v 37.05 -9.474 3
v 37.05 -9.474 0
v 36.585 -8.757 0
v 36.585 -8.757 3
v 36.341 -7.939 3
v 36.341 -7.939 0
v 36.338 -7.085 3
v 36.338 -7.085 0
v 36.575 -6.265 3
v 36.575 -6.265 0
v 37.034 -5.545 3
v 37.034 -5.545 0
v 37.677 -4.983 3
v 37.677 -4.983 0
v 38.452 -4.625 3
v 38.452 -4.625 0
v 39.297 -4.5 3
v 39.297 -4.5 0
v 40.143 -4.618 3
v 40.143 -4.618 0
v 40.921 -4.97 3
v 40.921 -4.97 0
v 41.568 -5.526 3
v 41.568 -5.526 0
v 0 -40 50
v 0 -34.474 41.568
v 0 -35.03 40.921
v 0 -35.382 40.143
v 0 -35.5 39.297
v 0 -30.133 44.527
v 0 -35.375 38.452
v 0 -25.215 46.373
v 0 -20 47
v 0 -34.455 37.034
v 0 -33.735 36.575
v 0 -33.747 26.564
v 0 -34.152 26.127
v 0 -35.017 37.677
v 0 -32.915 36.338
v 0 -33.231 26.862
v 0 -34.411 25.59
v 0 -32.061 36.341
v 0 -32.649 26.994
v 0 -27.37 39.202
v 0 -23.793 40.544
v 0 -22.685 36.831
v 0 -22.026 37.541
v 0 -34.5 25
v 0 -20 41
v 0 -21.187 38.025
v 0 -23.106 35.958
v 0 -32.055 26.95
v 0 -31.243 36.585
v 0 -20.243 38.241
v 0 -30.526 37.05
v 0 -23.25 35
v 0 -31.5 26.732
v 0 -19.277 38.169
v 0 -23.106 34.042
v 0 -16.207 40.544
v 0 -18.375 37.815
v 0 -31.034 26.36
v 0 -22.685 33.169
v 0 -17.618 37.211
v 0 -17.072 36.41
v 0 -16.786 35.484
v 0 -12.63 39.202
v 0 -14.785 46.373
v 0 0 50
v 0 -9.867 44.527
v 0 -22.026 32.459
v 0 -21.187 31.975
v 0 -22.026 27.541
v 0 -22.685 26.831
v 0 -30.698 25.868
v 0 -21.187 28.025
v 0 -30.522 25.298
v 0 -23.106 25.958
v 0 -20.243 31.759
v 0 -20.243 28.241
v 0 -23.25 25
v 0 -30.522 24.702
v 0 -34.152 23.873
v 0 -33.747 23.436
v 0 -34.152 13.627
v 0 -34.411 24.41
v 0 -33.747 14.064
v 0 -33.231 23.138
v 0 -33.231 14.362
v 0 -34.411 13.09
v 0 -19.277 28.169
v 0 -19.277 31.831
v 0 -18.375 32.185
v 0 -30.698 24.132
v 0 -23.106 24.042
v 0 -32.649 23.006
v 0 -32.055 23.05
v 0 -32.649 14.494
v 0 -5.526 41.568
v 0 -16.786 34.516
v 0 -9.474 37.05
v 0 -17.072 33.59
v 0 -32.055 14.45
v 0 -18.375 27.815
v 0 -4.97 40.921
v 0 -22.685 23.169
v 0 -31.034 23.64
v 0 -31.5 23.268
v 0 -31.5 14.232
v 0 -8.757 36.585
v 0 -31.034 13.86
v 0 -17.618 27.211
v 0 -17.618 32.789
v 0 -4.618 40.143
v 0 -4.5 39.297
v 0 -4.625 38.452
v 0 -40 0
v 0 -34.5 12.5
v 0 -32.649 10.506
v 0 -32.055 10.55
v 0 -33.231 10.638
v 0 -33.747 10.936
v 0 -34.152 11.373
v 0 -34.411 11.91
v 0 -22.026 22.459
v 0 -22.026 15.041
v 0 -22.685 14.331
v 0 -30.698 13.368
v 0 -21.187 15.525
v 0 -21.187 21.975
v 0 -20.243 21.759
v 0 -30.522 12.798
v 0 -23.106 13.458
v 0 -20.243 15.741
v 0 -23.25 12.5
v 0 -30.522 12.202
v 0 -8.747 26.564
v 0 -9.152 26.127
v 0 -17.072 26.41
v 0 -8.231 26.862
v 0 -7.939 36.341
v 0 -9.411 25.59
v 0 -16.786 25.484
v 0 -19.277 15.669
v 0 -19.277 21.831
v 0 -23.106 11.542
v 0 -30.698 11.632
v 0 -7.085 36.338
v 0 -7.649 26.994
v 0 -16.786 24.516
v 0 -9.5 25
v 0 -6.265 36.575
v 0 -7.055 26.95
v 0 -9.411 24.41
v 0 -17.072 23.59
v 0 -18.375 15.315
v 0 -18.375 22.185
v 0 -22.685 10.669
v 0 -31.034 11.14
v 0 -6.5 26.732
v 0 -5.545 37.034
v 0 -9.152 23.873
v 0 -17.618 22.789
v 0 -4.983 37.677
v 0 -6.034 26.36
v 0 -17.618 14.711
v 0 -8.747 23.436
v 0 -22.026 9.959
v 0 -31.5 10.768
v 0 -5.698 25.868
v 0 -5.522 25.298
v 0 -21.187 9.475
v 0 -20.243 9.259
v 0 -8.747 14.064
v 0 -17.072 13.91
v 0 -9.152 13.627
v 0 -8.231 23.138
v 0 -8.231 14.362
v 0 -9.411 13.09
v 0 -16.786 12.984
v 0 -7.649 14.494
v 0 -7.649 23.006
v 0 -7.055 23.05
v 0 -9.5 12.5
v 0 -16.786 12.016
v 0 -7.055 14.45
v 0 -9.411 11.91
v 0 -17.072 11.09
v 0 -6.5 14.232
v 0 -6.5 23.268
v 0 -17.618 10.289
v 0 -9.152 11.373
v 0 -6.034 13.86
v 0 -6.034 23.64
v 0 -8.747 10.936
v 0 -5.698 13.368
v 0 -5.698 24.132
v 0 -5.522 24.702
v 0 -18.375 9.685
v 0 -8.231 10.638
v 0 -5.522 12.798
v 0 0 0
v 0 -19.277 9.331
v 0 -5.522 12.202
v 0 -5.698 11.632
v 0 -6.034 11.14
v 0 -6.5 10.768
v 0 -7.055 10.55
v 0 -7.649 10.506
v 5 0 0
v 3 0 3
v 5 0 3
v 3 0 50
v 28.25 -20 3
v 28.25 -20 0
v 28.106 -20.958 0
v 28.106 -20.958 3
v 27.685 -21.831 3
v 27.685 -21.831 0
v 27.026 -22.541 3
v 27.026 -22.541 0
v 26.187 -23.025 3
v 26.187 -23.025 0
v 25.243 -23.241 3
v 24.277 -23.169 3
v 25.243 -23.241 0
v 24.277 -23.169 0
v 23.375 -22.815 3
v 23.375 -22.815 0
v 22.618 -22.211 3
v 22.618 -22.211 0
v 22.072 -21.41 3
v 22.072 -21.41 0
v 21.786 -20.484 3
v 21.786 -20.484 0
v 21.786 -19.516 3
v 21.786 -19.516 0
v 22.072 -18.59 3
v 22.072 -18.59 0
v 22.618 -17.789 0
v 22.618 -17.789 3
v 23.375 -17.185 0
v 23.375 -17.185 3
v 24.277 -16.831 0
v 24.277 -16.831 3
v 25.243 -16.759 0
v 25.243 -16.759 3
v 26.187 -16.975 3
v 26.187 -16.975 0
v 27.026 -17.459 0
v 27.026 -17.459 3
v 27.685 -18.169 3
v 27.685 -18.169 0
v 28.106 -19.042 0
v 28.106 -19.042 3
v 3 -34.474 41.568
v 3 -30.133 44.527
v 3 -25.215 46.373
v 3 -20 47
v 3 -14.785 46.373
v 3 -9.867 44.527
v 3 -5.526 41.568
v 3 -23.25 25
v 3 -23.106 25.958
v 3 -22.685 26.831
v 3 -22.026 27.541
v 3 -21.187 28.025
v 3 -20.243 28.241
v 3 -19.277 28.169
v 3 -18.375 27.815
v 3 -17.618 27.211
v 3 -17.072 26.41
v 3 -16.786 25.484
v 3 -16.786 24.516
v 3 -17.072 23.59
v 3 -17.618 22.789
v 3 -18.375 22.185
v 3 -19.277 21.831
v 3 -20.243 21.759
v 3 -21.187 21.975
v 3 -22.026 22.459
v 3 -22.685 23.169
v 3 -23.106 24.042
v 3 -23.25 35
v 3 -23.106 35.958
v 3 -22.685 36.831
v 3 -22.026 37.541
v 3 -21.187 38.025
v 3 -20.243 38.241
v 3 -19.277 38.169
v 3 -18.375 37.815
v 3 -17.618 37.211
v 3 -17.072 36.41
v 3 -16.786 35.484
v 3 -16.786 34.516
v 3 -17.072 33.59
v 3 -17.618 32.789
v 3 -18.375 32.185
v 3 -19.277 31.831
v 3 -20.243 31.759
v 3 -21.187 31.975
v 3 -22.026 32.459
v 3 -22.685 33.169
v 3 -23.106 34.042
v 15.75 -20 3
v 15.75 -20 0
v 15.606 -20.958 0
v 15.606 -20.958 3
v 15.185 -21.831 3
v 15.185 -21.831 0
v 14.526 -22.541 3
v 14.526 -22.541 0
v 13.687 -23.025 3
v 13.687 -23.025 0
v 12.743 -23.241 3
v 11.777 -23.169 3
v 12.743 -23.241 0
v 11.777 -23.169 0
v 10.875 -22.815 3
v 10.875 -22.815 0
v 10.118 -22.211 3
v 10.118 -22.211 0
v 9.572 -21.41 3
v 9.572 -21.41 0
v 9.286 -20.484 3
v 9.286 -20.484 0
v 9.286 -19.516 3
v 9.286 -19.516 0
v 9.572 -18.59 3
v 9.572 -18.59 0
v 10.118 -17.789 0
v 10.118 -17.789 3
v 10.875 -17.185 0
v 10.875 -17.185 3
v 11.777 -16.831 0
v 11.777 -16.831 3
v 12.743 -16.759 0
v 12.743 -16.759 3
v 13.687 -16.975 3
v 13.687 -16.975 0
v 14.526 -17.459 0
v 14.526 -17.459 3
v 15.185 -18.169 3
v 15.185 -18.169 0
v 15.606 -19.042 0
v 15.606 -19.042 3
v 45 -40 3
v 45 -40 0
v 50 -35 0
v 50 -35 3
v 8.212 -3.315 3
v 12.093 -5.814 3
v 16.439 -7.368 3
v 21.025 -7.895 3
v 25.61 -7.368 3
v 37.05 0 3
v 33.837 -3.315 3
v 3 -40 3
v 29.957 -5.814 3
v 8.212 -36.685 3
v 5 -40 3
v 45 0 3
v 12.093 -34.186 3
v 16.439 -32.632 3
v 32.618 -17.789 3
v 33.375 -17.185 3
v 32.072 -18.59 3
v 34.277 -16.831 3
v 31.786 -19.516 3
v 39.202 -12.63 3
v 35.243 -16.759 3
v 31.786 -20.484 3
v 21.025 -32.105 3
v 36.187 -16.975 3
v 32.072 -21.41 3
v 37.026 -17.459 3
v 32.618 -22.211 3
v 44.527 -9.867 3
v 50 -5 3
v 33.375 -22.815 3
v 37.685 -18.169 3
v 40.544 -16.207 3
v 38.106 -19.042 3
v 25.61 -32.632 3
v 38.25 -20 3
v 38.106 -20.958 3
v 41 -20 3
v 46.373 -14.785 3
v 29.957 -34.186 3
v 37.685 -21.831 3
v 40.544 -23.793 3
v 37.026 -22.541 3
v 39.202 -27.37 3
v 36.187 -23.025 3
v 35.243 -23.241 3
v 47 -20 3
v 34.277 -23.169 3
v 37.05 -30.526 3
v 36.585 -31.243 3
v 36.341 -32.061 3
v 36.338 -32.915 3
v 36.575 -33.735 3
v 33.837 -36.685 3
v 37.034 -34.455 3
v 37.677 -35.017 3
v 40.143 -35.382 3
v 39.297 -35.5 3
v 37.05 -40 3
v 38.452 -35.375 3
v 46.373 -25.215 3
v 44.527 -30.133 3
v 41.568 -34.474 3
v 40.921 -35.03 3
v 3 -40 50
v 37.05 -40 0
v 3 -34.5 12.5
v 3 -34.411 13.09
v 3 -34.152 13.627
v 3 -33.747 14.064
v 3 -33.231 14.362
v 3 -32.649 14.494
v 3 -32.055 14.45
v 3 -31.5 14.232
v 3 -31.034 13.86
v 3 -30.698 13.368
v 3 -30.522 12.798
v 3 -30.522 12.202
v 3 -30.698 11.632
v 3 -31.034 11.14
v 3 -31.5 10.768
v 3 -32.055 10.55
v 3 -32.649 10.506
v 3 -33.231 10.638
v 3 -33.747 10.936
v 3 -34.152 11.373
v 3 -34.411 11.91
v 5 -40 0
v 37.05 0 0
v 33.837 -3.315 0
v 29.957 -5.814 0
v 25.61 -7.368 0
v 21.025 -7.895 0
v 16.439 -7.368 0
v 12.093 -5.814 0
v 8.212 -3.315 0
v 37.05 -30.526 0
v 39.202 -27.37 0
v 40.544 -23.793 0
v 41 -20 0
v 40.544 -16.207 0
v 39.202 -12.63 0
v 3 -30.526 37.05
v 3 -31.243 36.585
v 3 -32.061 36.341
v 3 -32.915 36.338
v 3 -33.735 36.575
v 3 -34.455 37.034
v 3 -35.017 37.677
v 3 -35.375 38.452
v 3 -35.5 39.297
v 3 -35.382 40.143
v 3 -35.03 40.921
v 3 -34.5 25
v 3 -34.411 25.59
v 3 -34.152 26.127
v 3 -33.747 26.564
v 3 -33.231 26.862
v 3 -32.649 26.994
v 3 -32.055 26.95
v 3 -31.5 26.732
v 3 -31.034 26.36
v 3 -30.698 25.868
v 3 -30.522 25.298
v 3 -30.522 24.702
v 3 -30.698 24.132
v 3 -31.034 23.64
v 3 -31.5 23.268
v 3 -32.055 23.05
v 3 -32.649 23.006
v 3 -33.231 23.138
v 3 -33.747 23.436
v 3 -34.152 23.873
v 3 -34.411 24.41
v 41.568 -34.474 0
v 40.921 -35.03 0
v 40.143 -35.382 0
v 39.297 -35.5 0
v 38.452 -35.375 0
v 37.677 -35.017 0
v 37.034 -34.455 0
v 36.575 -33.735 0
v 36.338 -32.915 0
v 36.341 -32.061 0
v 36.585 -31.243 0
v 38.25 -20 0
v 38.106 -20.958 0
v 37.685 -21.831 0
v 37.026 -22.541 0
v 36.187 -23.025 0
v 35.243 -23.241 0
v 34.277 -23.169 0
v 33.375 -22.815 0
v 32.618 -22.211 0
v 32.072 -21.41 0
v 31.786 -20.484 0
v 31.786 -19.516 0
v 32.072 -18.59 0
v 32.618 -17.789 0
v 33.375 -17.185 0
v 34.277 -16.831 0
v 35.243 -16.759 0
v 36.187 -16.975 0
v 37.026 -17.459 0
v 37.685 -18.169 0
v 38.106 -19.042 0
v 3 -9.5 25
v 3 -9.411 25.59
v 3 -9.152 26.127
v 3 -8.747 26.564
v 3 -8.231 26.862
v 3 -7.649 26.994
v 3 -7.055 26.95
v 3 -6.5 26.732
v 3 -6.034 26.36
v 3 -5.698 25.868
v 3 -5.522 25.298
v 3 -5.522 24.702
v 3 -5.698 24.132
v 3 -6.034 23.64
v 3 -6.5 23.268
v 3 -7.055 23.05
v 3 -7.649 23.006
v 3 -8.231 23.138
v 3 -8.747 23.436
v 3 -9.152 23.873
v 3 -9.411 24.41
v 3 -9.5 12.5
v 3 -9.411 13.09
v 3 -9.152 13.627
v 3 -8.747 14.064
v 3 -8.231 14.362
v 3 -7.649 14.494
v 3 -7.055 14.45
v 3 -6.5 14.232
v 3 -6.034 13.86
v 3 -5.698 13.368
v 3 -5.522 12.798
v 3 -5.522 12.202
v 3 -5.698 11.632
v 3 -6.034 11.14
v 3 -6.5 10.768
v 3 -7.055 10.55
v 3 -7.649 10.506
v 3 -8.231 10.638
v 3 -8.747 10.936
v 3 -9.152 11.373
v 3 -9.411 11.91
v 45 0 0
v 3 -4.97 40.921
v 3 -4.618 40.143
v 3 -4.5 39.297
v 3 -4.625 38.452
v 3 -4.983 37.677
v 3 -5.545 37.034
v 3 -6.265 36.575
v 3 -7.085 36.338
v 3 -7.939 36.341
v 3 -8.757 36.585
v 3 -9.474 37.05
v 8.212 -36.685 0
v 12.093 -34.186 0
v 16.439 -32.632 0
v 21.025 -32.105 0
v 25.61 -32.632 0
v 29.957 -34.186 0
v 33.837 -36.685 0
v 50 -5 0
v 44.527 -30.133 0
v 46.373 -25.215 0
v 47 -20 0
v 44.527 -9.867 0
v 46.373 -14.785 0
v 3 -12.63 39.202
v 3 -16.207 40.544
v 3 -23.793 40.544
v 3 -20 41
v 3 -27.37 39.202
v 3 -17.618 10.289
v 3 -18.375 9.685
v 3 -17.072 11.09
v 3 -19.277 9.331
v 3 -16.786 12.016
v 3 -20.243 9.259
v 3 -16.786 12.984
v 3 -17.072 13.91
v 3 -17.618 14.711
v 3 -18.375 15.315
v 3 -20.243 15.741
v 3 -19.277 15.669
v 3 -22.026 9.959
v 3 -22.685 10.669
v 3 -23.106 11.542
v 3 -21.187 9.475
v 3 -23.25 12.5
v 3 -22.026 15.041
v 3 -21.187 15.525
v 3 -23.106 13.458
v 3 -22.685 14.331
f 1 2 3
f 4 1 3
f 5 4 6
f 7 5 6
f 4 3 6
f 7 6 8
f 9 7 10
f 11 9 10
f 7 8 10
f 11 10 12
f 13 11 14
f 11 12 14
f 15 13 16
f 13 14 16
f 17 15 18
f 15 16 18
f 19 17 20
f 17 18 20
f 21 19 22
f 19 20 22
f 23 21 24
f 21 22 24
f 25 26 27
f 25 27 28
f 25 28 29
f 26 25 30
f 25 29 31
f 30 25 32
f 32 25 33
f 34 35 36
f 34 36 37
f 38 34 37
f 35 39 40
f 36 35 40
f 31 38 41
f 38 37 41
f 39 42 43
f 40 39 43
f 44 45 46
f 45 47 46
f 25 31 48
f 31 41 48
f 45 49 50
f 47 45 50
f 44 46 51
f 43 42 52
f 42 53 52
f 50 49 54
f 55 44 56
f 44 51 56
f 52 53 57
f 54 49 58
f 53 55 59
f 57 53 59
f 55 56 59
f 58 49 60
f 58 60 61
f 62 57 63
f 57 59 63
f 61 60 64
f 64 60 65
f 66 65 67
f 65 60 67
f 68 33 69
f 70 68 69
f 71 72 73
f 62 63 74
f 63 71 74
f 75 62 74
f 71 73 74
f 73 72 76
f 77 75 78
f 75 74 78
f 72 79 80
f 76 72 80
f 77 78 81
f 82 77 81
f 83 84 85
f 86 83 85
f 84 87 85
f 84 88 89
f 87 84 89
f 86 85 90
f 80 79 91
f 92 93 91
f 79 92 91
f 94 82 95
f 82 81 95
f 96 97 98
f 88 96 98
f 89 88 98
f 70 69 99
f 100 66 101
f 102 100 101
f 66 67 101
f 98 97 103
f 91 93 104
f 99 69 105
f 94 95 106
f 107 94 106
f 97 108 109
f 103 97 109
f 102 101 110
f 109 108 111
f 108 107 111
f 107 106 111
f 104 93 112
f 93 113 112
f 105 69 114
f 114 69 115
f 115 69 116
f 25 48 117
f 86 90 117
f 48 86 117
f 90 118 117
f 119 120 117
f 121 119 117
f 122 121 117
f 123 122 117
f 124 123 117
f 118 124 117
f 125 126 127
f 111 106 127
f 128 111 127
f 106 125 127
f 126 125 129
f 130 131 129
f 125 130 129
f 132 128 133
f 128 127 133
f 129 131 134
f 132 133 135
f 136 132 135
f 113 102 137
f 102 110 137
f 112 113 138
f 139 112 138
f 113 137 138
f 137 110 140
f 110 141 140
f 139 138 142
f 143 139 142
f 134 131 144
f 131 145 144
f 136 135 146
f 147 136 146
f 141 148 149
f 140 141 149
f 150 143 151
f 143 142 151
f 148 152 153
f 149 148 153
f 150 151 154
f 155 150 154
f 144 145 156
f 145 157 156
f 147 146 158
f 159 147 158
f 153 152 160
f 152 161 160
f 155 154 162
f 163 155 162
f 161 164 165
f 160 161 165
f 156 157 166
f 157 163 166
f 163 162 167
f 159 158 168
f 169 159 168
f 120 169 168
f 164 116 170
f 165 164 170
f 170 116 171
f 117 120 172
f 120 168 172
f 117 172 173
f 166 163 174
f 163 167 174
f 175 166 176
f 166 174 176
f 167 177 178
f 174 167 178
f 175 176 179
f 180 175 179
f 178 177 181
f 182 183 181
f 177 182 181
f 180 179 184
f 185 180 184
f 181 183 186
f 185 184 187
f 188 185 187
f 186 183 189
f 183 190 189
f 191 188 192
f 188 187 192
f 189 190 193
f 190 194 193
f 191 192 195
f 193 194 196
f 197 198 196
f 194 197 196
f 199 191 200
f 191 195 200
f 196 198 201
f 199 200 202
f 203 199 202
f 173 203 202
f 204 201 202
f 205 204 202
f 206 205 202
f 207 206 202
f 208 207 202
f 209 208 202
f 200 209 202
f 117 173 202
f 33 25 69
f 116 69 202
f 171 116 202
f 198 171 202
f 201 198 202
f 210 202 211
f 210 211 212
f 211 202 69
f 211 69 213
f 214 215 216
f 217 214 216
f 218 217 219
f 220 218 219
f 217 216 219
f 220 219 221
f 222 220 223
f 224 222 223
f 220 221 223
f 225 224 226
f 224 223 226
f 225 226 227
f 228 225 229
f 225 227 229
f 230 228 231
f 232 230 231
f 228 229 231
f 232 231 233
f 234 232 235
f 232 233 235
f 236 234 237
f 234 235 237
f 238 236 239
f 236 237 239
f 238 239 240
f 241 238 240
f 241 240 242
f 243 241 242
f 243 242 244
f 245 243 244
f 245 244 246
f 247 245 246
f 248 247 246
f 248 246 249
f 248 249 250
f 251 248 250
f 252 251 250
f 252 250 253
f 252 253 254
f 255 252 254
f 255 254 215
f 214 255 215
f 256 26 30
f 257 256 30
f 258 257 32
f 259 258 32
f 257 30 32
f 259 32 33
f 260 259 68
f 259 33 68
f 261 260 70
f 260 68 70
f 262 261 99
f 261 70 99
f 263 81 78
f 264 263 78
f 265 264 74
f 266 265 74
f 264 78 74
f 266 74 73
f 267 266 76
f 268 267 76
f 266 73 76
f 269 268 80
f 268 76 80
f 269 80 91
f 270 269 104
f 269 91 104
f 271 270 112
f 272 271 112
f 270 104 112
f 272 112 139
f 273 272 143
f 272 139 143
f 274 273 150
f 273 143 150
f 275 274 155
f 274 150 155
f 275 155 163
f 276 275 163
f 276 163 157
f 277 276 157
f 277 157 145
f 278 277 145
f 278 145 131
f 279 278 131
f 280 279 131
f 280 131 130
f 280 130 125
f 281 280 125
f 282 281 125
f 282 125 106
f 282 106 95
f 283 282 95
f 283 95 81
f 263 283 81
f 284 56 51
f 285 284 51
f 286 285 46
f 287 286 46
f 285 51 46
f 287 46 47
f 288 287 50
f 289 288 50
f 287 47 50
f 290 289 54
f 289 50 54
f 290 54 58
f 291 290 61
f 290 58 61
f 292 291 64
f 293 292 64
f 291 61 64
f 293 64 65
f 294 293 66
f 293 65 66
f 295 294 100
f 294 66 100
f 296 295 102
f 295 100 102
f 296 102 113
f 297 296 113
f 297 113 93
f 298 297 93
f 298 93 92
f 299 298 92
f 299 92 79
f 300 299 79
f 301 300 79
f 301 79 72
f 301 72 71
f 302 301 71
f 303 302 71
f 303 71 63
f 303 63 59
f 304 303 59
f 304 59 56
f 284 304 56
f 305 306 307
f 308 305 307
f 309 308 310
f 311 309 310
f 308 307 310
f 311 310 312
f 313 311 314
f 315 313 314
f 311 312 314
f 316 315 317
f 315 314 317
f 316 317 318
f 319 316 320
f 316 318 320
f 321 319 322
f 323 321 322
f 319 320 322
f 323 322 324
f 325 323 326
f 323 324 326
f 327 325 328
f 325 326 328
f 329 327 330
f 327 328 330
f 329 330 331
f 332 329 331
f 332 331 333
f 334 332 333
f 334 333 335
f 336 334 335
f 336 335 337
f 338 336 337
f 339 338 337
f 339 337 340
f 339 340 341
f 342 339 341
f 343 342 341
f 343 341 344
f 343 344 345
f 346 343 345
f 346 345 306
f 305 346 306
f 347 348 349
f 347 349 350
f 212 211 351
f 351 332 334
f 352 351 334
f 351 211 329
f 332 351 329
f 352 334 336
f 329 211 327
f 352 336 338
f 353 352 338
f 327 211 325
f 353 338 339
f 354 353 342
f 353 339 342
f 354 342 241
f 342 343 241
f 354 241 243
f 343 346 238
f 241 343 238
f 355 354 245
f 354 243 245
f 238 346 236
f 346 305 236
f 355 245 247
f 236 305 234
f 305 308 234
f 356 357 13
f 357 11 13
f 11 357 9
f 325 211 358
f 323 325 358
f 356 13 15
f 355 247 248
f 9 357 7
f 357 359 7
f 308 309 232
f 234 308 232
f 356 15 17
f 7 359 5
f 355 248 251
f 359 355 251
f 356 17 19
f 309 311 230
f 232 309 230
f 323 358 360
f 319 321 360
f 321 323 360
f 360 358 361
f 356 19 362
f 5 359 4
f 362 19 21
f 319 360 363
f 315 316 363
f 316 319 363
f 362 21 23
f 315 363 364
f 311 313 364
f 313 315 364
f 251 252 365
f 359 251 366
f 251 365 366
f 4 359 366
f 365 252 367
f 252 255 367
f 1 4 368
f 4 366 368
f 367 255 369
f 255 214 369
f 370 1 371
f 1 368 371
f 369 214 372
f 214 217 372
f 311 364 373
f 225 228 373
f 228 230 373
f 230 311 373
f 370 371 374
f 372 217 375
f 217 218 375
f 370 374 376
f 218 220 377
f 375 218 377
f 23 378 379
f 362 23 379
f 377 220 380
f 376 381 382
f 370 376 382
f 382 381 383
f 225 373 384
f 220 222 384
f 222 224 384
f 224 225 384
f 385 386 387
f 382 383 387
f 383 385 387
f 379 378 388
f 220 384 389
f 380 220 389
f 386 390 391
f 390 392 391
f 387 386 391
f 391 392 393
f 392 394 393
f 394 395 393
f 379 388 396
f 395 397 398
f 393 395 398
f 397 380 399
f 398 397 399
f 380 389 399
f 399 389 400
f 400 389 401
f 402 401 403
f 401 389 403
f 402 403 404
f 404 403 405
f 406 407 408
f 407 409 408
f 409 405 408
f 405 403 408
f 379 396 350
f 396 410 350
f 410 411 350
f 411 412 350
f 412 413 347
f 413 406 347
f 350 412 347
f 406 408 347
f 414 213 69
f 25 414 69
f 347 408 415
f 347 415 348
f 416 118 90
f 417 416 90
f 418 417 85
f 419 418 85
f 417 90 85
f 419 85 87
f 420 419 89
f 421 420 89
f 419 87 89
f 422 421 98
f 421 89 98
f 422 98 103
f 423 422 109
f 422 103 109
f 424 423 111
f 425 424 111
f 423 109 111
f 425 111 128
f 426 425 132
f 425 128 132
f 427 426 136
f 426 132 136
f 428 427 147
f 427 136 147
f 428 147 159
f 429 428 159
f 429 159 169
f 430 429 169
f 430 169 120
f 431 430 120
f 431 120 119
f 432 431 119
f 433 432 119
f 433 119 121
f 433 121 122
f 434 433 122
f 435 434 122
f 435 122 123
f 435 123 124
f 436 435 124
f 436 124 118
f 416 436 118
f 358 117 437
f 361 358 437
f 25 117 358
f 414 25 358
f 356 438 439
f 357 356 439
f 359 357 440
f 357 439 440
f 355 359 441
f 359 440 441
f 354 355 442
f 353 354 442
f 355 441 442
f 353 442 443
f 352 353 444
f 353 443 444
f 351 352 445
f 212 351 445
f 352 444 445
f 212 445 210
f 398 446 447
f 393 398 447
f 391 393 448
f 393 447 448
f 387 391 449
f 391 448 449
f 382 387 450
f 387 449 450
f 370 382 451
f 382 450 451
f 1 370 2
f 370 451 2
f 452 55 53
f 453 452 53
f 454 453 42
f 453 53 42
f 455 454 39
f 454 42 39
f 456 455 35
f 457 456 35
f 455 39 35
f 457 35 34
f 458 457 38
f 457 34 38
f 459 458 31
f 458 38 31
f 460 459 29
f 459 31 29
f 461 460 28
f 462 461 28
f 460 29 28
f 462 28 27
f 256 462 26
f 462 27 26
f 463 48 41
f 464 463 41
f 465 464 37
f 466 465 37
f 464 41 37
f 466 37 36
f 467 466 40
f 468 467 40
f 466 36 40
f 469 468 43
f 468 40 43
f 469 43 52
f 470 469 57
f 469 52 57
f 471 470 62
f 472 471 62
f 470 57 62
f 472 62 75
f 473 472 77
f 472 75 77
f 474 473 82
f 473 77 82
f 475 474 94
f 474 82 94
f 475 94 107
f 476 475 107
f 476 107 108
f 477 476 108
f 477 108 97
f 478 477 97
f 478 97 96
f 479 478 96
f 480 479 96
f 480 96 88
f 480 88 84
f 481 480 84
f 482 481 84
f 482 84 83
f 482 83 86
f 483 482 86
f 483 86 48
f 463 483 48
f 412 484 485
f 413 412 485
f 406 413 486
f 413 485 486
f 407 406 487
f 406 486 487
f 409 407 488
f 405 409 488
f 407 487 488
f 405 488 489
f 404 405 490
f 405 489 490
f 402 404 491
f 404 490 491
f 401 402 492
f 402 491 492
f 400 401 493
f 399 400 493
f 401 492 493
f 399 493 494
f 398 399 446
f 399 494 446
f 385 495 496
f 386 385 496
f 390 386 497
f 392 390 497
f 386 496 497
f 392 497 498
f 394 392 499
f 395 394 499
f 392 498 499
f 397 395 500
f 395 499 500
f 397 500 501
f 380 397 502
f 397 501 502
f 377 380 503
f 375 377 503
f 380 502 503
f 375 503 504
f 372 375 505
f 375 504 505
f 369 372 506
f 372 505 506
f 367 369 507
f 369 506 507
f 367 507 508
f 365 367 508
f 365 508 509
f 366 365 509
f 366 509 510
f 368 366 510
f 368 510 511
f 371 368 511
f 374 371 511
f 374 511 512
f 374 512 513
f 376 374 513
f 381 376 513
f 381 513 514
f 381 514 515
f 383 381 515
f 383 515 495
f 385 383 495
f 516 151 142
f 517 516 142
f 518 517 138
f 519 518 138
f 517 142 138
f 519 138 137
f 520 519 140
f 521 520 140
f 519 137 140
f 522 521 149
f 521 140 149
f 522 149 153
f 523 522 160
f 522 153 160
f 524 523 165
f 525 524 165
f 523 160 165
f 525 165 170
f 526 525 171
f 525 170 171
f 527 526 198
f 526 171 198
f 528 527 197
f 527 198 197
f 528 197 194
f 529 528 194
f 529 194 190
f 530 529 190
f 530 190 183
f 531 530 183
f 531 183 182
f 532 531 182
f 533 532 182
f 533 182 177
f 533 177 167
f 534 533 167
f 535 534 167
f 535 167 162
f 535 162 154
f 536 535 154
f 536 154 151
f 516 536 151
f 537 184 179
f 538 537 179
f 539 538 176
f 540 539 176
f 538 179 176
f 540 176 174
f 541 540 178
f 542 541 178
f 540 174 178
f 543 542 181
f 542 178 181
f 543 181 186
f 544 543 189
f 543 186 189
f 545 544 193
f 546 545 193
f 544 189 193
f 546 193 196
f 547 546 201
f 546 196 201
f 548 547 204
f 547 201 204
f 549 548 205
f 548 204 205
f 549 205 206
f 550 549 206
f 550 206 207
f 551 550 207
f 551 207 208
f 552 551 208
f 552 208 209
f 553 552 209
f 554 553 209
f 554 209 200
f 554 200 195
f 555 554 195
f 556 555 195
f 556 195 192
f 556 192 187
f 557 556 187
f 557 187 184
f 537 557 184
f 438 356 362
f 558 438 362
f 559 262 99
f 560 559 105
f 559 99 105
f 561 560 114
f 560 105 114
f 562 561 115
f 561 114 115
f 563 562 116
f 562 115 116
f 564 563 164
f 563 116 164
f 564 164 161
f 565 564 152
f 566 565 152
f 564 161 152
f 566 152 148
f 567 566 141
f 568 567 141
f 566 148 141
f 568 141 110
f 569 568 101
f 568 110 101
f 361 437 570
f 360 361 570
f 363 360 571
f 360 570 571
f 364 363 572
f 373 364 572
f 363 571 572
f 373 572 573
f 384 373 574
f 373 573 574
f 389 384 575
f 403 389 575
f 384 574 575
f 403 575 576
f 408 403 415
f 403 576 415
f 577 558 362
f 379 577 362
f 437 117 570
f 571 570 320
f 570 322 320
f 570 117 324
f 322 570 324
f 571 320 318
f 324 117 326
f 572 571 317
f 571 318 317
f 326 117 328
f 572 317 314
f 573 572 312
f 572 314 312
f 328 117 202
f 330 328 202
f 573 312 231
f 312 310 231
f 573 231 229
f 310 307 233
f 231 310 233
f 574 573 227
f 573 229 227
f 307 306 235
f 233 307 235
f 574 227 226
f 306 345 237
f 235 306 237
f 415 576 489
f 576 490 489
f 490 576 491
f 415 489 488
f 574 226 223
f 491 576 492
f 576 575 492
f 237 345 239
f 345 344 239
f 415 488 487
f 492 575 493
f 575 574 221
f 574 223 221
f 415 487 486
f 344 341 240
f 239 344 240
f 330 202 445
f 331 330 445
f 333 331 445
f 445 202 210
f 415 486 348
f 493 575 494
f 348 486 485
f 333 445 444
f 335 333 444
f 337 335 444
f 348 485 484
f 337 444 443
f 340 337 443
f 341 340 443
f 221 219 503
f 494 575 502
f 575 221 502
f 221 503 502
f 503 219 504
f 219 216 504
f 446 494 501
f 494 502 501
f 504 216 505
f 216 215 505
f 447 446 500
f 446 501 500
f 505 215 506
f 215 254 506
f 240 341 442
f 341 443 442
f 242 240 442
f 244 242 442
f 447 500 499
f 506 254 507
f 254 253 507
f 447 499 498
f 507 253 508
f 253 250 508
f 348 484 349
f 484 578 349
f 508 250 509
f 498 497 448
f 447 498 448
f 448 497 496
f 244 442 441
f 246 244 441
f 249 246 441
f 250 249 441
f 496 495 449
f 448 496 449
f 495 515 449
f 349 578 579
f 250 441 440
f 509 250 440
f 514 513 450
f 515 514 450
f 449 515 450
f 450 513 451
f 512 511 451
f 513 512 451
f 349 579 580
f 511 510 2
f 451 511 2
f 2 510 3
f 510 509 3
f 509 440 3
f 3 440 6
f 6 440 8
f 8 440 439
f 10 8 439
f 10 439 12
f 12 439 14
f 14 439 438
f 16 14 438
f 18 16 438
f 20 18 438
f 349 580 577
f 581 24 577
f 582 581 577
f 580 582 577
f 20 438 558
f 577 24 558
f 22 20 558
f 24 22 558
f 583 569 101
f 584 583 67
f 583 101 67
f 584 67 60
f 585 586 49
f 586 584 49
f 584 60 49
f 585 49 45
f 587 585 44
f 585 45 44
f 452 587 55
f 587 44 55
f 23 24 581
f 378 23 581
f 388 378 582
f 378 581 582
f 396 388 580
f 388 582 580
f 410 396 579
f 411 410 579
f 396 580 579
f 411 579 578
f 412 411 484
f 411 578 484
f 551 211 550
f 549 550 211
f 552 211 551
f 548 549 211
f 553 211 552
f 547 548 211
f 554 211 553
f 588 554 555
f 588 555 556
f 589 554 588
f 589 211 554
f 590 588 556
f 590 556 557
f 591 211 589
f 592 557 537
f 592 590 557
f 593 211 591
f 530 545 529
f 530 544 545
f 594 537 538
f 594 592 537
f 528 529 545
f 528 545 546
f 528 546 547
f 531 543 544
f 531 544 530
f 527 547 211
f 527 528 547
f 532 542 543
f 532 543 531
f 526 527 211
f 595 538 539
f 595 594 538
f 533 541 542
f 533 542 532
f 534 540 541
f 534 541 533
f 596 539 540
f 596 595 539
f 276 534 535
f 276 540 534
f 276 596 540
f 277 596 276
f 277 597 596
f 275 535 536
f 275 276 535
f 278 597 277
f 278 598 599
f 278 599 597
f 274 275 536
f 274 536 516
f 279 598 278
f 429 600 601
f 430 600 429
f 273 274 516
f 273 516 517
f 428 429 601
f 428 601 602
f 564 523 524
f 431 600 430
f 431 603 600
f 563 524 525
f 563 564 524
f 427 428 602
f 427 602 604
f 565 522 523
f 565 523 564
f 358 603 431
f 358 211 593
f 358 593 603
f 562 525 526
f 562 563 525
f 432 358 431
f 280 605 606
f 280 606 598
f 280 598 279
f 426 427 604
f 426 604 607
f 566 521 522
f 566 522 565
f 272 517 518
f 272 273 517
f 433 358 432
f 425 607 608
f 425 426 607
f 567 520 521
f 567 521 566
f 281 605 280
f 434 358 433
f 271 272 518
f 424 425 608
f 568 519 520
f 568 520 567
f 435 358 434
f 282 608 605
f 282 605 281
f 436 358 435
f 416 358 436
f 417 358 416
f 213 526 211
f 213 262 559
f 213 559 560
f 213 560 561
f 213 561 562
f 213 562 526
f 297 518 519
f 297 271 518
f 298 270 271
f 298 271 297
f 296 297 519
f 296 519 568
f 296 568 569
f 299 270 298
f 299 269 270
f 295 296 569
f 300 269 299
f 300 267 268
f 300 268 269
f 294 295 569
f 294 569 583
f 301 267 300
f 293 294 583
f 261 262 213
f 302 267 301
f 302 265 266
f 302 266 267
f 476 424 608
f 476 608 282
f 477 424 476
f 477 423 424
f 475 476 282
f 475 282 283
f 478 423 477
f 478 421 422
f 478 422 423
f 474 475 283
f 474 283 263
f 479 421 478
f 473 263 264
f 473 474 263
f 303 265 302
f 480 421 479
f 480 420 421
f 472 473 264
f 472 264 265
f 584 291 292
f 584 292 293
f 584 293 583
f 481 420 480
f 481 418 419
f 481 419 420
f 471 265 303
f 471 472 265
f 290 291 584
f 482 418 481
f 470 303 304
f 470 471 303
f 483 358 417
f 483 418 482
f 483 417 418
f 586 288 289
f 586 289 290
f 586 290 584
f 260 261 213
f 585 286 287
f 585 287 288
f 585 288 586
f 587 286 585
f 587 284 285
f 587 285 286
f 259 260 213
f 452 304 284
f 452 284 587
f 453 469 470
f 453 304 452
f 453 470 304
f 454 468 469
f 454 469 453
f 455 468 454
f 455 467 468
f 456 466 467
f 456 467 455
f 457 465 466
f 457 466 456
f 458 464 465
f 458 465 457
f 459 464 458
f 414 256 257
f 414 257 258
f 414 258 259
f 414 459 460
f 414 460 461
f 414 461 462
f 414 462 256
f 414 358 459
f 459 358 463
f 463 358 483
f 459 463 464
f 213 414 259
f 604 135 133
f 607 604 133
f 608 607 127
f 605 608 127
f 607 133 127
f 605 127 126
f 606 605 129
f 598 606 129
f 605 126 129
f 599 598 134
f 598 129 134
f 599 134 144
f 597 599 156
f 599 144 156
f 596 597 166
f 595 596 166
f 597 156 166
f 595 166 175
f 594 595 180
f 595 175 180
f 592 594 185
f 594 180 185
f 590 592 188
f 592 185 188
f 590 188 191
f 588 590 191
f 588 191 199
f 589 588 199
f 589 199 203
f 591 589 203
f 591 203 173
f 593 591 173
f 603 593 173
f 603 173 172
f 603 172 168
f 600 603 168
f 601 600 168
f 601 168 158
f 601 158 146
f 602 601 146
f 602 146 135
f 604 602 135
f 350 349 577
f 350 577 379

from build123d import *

# Parameters (mm, degrees)
F1_DEPTH  = 40
F2_R      = 3.25
F3_DEPTH  = 25
F4_R      = 3.25
F4_R_2    = 2
F5_DEPTH  = 25
F6_SIZE   = 5
F7_SIZE   = 5
F8_DEPTH  = 25
F9_W      = 50.789644
F9_H      = 57.590966
F10_DEPTH = 51.1


with BuildPart() as f1:
    # F0 (on Front) → F1 (new body)
    with BuildSketch(Plane.XZ):
        Polygon((0, 50), (0, 0), (50, 0), (50, 5), (5, 5), (5, 50), align=None)
    extrude(amount=F1_DEPTH)

    # F2 (on face) → F3 (cut)
    with BuildSketch(Plane(origin=(0, 0, 0), x_dir=(1, 0, 0), z_dir=(0, 0, -1))):
        with Locations((25, 20)):
            Circle(F2_R)
        with BuildLine():
            ThreePointArc((37.049758, 30.526316), (41, 20), (37.049758, 9.473684))
            ThreePointArc((37.049758, 9.473684), (37.335405, 5.240671), (41.568419, 5.526317))
            ThreePointArc((41.568419, 5.526317), (47, 20.000001), (41.568418, 34.473684))
            ThreePointArc((41.568418, 34.473684), (37.335404, 34.75933), (37.049758, 30.526316))
        make_face()
        with Locations((12.5, 20)):
            Circle(F2_R)
        with Locations((35, 20)):
            Circle(F2_R)
        with BuildLine():
            Line((26.554622, -9.521332), (37.049758, 0))
            ThreePointArc((37.049758, 0), (21.024879, 7.89477), (5, 0))
            Line((5, 0), (26.554622, -9.521332))
        make_face()
        with BuildLine():
            Line((21.024879, 52.316344), (5, 40))
            ThreePointArc((5, 40), (21.024879, 32.105231), (37.049758, 40))
            Line((37.049758, 40), (21.024879, 52.316344))
        make_face()
    extrude(amount=-F3_DEPTH, mode=Mode.SUBTRACT)

    # F4 (on face) → F5 (cut)
    with BuildSketch(Plane(origin=(0, 0, 0), x_dir=(0, -1, 0), z_dir=(-1, 0, 0))):
        with Locations((20, 12.5)):
            Circle(F4_R)
        with Locations((20, 25)):
            Circle(F4_R)
        with Locations((20, 35)):
            Circle(F4_R)
        with BuildLine():
            ThreePointArc((9.473684, 37.049758), (20, 41), (30.526316, 37.049758))
            ThreePointArc((30.526316, 37.049758), (34.75933, 37.335404), (34.473684, 41.568418))
            ThreePointArc((34.473684, 41.568418), (20, 47), (5.526316, 41.568418))
            ThreePointArc((5.526316, 41.568418), (5.24067, 37.335404), (9.473684, 37.049758))
        make_face()
        with Locations((32.5, 12.5)):
            Circle(F4_R_2)
        with Locations((32.5, 25)):
            Circle(F4_R_2)
        with Locations((7.5, 25)):
            Circle(F4_R_2)
        with Locations((7.5, 12.5)):
            Circle(F4_R_2)
    extrude(amount=-F5_DEPTH, mode=Mode.SUBTRACT)

    # F6
    f6_edges = [f1.edges().sort_by_distance(p)[0] for p in [
        (50, -40, 2.5),
    ]]
    chamfer(f6_edges, length=F6_SIZE)

    # F7
    f7_edges = [f1.edges().sort_by_distance(p)[0] for p in [
        (50, 0, 2.5),
    ]]
    chamfer(f7_edges, length=F7_SIZE)

    # F2 (on face) → F8 (cut)
    with BuildSketch(Plane(origin=(0, 0, 0), x_dir=(1, 0, 0), z_dir=(0, 0, -1))):
        with Locations((25, 20)):
            Circle(F2_R)
        with BuildLine():
            ThreePointArc((37.049758, 30.526316), (41, 20), (37.049758, 9.473684))
            ThreePointArc((37.049758, 9.473684), (37.335405, 5.240671), (41.568419, 5.526317))
            ThreePointArc((41.568419, 5.526317), (47, 20.000001), (41.568418, 34.473684))
            ThreePointArc((41.568418, 34.473684), (37.335404, 34.75933), (37.049758, 30.526316))
        make_face()
        with Locations((12.5, 20)):
            Circle(F2_R)
        with Locations((35, 20)):
            Circle(F2_R)
        with BuildLine():
            Line((26.554622, -9.521332), (37.049758, 0))
            ThreePointArc((37.049758, 0), (21.024879, 7.89477), (5, 0))
            Line((5, 0), (26.554622, -9.521332))
        make_face()
        with BuildLine():
            Line((21.024879, 52.316344), (5, 40))
            ThreePointArc((5, 40), (21.024879, 32.105231), (37.049758, 40))
            Line((37.049758, 40), (21.024879, 52.316344))
        make_face()
    extrude(amount=F8_DEPTH, mode=Mode.SUBTRACT)

    # F9 (on face) → F10 (cut)
    with BuildSketch(Plane.XZ.offset(40)):
        with Locations((28.394822, 31.795483)):
            Rectangle(F9_W, F9_H)
    extrude(amount=-F10_DEPTH, mode=Mode.SUBTRACT)


solid = f1.part
